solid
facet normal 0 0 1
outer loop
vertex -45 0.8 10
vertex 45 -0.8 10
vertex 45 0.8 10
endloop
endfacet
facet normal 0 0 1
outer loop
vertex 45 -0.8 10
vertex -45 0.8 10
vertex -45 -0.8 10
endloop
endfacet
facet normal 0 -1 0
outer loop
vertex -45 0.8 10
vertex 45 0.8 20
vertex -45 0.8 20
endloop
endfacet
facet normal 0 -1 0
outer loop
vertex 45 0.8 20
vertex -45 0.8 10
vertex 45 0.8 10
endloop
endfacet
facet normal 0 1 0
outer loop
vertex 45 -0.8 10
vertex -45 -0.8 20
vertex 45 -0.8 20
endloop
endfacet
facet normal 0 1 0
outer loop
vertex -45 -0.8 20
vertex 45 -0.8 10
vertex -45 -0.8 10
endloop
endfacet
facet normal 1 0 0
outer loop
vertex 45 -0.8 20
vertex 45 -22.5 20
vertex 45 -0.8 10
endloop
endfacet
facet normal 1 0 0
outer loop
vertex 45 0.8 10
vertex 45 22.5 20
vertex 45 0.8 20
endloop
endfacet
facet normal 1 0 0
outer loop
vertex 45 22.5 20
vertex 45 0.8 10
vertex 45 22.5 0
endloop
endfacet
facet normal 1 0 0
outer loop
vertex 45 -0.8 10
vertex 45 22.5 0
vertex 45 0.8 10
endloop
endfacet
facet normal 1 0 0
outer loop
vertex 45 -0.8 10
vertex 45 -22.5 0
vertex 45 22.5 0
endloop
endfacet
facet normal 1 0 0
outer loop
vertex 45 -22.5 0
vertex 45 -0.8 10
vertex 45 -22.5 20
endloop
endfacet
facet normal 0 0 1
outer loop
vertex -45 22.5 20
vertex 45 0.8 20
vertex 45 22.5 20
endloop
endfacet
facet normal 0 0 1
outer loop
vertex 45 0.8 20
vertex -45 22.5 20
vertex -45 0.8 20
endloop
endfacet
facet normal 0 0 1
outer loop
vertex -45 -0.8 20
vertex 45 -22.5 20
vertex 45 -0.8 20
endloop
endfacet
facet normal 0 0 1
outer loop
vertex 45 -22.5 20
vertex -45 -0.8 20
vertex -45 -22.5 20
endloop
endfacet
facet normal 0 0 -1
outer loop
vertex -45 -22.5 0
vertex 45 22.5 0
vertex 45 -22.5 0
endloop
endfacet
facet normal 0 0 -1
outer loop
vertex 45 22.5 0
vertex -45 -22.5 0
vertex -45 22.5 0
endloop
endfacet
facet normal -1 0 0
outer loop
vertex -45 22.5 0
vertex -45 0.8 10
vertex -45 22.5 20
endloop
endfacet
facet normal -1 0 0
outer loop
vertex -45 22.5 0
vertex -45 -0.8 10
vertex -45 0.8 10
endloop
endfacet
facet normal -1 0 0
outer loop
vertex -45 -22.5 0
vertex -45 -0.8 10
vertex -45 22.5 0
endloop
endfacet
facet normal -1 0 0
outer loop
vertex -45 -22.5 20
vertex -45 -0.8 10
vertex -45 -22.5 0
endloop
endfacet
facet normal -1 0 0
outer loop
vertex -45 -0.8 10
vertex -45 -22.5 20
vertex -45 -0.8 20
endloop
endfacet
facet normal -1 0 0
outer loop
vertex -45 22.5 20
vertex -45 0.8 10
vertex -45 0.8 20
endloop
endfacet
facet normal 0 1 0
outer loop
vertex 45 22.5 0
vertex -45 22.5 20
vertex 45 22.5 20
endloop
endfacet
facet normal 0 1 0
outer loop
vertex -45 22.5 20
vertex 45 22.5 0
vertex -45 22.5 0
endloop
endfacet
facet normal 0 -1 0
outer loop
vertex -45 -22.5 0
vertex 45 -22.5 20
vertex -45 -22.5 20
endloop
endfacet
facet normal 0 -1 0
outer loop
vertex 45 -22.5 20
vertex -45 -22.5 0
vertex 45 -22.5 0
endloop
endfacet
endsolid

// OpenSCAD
// Slide drying rack - holds 10 microscope slides upright on their long edge
// Print orientation: base block on the bed (z = 0), slots open upward (+Z)

// ---------------- Parameters ----------------
block_len    = 90;    // block length along X (mm)
block_wid    = 45;    // block width along Y (mm)
block_h      = 20;    // block height along Z (mm)

slot_count   = 10;    // number of slide slots
slot_len     = 77;    // slot length along X (mm)
slot_w       = 1.6;   // slot width along Y (mm)
slot_depth   = 10;    // slot depth from top face (mm)
slot_pitch   = 3.5;   // centre-to-centre slot spacing along Y (mm)

eps          = 0.5;   // overshoot of cutters past the top face (mm)

$fn = 64;

// ---------------- Model ----------------
difference() {
    // Base block, centred in X and Y, resting on z = 0
    translate([-block_len/2, -block_wid/2, 0])
        cube([block_len, block_wid, block_h]);

    // Parallel slots running along X, centred as a group in X and Y
    for (i = [0 : slot_count - 1]) {
        x = (i - (slot_count - 1)/2) * slot_pitch;
        translate([x - slot_len/2, -slot_w/2, block_h - slot_depth])
            cube([slot_len, slot_w, slot_depth + eps]);
    }
}
